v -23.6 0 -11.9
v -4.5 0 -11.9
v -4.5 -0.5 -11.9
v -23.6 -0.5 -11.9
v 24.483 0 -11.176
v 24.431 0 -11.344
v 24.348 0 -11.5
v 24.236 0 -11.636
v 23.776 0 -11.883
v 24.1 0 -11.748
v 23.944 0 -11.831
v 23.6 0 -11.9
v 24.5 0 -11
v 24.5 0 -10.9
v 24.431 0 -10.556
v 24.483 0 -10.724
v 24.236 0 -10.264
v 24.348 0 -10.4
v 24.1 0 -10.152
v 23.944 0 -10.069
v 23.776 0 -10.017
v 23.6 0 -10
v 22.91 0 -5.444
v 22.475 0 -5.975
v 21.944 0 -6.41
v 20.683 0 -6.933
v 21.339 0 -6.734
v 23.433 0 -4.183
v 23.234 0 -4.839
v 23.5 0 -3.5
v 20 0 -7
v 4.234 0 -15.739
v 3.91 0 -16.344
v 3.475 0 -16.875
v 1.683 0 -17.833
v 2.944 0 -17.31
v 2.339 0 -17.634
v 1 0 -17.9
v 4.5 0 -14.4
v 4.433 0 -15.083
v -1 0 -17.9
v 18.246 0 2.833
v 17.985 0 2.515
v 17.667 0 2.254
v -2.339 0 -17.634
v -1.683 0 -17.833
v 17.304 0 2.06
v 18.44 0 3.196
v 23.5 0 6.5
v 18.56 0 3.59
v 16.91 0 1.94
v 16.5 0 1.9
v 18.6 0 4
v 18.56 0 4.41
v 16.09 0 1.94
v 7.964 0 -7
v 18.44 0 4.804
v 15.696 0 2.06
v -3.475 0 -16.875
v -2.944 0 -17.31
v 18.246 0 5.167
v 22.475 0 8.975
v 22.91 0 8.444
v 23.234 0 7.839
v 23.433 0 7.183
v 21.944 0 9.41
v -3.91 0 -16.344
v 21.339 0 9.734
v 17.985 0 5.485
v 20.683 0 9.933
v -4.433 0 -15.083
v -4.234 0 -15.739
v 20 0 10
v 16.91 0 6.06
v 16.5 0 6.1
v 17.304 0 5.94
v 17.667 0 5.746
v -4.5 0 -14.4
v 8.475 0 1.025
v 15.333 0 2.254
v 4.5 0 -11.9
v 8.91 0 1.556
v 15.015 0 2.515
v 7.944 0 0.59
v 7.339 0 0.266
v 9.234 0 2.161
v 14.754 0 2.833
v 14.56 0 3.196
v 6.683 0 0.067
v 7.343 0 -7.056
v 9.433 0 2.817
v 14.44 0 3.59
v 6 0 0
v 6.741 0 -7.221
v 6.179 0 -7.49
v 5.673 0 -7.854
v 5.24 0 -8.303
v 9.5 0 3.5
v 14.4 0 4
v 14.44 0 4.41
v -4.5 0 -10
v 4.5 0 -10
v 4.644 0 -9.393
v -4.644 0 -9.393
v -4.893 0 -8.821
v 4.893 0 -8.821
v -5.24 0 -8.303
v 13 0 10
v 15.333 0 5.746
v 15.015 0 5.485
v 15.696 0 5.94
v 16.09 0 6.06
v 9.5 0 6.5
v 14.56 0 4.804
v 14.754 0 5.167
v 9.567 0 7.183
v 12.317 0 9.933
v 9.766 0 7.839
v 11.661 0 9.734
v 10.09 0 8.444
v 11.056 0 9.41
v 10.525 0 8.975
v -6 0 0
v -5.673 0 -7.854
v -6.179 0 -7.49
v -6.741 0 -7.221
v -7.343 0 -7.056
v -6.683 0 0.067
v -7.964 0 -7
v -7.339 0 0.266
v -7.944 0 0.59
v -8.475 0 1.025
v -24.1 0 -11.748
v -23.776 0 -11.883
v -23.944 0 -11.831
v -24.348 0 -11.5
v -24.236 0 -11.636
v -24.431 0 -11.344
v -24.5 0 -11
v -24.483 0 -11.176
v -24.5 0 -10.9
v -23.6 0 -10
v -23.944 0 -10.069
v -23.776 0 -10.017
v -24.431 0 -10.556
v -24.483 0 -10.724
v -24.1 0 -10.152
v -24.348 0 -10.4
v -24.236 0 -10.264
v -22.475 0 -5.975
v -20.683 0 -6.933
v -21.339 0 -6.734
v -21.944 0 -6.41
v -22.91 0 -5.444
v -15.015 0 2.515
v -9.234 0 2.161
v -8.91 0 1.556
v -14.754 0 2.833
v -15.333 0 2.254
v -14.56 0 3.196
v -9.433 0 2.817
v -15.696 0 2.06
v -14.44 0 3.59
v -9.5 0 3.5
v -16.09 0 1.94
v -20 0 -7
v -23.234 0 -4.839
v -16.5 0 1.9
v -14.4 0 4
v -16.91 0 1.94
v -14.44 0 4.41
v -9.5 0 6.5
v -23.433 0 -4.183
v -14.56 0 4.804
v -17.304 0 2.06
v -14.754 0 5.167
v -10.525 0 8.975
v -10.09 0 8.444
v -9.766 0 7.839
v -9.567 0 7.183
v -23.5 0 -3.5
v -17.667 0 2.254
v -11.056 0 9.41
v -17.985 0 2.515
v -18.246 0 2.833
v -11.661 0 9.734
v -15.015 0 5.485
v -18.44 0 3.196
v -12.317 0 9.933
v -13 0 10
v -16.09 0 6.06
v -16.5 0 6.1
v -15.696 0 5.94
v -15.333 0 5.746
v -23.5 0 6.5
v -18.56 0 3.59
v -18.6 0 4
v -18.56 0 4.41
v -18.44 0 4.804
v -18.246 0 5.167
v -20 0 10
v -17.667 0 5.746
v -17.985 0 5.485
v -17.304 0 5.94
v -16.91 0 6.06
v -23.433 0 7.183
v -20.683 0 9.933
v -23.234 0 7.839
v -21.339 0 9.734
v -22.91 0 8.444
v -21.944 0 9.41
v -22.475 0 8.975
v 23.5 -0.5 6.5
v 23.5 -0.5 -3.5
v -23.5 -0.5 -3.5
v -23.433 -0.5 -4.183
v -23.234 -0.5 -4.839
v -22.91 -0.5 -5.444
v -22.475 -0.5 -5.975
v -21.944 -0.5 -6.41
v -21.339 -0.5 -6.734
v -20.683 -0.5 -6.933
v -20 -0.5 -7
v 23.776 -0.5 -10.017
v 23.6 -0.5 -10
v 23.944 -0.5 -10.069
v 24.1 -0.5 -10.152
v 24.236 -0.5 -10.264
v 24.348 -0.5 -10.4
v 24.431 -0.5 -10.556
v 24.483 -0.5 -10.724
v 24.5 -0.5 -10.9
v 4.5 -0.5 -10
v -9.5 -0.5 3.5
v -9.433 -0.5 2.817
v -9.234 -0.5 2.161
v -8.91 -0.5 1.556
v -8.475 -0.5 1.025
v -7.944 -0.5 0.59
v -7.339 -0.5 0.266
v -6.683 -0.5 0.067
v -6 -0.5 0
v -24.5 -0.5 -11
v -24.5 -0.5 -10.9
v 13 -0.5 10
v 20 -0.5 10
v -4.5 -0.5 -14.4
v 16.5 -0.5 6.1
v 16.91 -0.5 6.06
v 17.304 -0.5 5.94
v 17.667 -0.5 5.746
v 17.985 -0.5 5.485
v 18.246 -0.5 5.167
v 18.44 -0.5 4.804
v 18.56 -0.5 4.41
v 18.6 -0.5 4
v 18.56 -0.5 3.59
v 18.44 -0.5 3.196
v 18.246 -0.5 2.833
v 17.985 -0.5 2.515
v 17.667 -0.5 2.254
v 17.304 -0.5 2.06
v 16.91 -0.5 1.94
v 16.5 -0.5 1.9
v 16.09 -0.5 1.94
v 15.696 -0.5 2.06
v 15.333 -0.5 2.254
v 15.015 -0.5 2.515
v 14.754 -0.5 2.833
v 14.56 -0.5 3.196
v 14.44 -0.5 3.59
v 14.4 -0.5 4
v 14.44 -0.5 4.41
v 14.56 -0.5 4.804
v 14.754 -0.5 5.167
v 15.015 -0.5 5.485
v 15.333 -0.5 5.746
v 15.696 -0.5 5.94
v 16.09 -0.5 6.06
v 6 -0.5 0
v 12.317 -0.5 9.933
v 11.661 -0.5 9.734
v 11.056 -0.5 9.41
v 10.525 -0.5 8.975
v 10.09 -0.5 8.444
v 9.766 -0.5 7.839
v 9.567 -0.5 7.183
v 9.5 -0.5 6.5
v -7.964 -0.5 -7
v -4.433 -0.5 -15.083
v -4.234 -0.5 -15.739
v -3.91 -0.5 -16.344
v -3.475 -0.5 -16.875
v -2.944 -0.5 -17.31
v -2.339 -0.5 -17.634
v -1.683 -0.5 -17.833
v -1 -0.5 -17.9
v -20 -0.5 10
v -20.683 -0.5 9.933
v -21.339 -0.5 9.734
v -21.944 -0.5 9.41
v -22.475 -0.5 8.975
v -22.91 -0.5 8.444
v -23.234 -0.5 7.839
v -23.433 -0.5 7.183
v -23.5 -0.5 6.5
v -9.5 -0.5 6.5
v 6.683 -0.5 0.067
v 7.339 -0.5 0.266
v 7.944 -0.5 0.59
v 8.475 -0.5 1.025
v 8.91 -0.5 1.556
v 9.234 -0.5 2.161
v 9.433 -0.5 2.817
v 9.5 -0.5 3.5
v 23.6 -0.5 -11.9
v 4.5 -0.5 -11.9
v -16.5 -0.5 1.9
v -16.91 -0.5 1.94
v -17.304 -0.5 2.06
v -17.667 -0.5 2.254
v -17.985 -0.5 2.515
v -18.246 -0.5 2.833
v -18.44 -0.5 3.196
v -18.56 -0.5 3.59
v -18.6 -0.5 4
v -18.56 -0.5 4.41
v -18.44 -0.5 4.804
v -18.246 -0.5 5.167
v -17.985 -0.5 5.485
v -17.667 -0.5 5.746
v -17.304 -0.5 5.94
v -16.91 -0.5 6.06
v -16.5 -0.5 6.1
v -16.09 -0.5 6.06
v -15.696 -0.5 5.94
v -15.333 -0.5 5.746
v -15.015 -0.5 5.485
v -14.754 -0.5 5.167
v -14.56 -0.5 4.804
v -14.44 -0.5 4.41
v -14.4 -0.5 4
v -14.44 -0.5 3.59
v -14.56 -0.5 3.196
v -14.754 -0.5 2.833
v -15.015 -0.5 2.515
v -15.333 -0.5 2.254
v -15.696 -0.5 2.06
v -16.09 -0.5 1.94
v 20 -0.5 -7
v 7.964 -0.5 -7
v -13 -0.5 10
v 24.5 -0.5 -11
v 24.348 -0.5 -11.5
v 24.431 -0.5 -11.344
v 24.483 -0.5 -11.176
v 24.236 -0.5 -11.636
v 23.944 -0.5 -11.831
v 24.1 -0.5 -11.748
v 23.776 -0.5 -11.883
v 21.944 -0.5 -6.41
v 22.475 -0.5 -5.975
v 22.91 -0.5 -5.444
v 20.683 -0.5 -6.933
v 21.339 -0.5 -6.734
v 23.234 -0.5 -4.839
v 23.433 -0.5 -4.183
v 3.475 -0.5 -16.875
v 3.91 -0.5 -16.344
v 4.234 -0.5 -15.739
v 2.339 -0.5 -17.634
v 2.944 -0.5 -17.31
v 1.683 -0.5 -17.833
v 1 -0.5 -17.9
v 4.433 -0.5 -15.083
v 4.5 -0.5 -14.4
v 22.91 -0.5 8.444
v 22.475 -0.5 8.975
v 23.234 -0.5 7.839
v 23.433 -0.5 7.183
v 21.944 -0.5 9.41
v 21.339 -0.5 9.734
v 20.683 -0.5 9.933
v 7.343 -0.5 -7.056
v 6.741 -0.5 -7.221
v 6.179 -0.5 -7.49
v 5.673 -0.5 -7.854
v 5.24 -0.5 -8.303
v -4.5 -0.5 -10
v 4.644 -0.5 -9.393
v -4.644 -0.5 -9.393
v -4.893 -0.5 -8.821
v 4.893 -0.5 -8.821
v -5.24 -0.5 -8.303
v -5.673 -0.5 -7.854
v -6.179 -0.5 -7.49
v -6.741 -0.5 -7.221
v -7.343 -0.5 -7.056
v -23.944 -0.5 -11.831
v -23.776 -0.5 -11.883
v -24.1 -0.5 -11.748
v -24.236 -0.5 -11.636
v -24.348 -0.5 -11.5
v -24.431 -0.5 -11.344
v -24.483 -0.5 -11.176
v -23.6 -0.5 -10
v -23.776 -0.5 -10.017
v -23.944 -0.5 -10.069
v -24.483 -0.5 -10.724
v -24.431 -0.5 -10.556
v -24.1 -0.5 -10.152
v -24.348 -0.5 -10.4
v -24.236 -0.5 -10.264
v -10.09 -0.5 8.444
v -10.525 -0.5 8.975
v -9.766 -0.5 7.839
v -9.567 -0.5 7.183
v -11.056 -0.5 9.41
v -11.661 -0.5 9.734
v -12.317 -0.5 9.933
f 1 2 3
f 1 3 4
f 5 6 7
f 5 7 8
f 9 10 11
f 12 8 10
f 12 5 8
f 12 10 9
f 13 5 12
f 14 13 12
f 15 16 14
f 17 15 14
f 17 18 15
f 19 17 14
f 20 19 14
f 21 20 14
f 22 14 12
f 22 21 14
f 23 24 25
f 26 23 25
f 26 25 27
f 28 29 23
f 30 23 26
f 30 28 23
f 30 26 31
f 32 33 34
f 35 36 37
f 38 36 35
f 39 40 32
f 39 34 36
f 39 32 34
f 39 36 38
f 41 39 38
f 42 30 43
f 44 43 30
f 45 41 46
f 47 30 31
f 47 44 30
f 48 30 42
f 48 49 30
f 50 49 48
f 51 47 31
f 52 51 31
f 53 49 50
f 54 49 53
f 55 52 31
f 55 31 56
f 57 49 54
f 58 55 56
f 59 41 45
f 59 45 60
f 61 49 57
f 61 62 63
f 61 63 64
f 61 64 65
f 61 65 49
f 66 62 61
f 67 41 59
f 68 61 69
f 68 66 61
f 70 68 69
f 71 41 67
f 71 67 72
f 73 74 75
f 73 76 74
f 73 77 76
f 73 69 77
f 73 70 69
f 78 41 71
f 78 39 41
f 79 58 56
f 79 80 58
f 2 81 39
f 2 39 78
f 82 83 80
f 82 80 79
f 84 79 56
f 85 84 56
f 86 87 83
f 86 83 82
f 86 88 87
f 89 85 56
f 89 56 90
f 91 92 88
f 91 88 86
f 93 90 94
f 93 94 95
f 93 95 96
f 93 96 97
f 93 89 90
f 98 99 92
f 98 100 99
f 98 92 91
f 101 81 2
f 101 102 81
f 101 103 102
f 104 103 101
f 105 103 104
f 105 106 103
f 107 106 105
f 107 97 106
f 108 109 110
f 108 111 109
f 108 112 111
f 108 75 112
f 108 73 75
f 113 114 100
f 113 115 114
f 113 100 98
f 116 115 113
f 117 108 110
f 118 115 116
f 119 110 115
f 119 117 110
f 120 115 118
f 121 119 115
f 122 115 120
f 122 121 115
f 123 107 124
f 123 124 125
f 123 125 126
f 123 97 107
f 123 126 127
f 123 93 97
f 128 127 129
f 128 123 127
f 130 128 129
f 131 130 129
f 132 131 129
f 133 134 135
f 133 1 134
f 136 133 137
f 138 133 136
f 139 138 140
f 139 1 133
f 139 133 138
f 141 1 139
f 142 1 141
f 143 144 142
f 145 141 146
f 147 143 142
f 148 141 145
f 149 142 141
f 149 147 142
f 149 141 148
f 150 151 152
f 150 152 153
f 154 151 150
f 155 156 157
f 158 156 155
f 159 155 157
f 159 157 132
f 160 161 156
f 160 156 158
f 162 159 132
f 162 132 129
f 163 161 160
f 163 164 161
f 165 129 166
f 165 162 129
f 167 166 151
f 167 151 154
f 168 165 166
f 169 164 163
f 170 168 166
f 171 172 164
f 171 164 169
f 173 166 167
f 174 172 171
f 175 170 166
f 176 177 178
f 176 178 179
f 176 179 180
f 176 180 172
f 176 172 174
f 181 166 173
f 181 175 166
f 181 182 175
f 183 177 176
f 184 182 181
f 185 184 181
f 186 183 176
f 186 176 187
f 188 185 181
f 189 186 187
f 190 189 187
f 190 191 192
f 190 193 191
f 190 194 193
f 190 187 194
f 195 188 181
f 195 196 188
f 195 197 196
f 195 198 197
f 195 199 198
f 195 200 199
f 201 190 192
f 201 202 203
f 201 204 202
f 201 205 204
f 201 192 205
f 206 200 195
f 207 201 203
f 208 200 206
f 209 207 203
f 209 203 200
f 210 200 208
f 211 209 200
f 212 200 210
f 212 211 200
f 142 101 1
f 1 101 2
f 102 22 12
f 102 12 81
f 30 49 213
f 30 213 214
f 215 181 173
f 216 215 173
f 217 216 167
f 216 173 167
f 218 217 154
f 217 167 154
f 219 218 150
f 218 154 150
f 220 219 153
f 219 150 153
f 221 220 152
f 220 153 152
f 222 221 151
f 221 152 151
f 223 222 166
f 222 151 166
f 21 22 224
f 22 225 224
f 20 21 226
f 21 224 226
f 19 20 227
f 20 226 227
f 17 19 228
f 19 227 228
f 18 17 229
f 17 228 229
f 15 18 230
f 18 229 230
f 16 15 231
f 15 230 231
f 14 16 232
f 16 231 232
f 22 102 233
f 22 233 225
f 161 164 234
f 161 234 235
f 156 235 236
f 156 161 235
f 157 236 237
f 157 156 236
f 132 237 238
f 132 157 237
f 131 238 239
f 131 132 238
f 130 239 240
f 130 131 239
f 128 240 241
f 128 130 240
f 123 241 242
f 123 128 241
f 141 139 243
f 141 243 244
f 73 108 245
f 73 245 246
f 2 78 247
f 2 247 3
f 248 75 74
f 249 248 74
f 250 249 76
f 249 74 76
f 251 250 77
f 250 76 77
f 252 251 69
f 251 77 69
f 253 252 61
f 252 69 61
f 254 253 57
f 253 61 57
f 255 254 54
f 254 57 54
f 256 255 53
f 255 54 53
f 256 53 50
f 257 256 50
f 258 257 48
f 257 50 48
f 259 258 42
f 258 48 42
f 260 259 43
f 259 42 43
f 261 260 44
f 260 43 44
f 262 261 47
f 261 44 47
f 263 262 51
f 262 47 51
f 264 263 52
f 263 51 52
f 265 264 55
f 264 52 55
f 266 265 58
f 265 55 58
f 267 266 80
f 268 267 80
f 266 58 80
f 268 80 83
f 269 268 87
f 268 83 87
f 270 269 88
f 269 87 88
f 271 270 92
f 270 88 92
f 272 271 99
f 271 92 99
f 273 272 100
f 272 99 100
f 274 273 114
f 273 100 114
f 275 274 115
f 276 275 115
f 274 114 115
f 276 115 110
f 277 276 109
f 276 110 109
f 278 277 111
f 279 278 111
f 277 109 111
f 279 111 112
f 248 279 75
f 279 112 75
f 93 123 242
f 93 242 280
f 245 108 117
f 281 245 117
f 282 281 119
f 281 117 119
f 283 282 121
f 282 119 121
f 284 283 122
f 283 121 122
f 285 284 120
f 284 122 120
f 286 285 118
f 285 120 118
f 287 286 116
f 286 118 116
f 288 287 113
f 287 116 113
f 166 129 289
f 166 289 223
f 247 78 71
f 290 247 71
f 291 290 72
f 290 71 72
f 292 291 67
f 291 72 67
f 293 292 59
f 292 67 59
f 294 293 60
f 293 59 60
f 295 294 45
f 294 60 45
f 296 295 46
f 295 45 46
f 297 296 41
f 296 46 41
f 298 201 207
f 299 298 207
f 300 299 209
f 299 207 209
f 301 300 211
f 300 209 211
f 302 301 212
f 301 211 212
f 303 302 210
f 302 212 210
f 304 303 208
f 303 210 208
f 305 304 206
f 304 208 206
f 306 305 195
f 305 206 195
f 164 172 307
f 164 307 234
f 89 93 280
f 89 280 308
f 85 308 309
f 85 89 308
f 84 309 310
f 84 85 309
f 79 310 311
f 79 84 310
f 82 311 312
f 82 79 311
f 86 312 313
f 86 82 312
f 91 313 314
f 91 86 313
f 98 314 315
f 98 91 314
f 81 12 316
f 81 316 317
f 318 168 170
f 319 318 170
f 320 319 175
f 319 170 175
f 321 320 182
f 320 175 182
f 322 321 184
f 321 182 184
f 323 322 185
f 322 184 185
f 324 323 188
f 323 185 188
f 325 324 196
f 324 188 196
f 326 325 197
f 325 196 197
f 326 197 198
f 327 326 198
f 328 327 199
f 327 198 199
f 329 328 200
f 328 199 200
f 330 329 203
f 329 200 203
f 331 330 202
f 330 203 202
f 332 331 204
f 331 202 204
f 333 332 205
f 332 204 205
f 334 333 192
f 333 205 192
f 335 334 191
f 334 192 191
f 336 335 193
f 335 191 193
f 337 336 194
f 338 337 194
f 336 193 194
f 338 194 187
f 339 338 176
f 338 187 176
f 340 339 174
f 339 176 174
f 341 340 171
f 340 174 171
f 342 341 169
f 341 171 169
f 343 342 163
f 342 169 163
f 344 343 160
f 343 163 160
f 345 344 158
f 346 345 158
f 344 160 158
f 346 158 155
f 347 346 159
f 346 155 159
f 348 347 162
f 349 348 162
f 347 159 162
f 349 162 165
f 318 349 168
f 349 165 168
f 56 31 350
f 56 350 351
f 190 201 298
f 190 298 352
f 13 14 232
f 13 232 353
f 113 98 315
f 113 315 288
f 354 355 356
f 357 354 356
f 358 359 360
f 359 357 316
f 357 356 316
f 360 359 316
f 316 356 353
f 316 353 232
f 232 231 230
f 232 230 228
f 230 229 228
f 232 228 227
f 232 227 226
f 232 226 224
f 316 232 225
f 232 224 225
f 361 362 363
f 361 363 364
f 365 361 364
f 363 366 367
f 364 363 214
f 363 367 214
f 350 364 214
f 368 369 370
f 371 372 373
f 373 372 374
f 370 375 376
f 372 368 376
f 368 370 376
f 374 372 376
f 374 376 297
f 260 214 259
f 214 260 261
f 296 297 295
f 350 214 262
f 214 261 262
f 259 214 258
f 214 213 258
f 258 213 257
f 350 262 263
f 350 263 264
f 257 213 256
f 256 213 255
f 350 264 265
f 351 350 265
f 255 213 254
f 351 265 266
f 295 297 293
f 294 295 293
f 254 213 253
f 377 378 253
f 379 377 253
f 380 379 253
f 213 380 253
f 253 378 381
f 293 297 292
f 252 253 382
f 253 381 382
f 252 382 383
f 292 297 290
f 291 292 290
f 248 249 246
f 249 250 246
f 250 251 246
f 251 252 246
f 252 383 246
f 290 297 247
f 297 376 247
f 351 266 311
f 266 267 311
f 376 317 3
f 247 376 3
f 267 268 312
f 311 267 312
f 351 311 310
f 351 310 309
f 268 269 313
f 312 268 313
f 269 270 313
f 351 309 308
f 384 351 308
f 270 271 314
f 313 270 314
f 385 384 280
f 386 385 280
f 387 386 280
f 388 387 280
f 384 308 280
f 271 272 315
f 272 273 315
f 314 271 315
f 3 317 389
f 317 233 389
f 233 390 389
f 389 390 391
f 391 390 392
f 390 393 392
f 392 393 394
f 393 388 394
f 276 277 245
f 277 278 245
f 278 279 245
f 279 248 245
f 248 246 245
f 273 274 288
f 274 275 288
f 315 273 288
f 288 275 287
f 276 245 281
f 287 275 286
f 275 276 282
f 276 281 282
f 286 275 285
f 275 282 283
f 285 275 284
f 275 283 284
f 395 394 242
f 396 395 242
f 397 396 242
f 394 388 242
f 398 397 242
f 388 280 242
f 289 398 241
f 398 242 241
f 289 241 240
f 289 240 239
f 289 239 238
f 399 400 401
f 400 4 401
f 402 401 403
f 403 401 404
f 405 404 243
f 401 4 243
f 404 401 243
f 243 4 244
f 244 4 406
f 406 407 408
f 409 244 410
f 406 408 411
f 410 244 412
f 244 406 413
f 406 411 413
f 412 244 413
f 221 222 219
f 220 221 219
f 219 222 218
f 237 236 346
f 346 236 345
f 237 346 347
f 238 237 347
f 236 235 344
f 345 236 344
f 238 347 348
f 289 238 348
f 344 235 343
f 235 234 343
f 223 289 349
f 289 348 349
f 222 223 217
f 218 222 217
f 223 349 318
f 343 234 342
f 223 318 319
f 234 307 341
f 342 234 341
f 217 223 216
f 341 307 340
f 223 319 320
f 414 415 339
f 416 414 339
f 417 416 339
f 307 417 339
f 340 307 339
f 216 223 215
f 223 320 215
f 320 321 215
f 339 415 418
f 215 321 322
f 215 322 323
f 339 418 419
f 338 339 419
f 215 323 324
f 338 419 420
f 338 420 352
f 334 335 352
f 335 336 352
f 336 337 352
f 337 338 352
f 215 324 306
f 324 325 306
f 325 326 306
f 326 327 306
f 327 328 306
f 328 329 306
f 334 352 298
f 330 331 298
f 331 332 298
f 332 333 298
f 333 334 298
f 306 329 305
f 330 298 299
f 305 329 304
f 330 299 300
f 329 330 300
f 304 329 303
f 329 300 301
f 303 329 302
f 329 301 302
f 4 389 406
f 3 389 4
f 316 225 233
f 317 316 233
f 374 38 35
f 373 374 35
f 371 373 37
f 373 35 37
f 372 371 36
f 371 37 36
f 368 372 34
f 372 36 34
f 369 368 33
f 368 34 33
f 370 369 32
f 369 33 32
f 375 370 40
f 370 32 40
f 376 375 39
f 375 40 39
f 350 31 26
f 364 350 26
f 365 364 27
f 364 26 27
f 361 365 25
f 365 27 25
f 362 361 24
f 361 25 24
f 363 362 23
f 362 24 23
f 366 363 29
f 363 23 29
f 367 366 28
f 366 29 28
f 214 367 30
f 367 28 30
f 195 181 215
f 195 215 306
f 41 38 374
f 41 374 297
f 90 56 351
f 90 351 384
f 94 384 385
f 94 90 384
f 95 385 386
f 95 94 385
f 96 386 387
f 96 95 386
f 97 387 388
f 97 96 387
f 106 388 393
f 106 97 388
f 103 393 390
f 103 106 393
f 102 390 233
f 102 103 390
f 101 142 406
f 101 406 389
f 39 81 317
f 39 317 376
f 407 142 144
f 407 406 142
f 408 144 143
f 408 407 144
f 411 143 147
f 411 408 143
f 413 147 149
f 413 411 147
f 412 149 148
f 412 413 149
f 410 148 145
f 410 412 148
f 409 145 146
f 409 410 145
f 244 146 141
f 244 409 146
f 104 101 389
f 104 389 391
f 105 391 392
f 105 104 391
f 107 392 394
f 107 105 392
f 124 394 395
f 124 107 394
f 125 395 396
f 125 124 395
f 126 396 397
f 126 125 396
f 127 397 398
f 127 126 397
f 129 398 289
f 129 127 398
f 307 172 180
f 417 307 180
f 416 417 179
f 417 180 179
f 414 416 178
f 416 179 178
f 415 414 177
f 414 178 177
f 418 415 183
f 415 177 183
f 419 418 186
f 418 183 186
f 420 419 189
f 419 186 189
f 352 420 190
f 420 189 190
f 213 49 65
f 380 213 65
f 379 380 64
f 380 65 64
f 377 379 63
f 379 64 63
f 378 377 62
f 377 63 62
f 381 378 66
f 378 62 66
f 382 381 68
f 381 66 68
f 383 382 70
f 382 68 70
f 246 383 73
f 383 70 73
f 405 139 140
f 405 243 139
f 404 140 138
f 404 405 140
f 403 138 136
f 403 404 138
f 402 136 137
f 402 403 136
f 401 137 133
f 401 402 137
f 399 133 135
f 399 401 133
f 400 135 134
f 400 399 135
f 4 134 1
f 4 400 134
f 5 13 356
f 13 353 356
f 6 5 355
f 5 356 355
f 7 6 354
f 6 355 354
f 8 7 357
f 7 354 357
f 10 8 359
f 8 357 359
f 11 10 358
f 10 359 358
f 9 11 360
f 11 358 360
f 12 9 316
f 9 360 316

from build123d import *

# Parameters (mm, degrees)
SKETCH2_R          = 2.1
BASE_FLANGE1_DEPTH = 0.5
FILLET1_R          = 3.5
FILLET2_R          = 0.9


# Sheet-metal steps are written as plain solids
with BuildPart() as part:
    # Base-Flange1: sheet metal written as solids
    # Sketch2 → Base-Flange1 (new body)
    with BuildSketch(Plane(origin=(0, 0, 0), x_dir=(1, 0, 0), z_dir=(0, 1, 0))):
        Polygon((-9.5, 0), (9.5, 0), (9.5, -10), (23.5, -10), (23.5, 7), (4.5, 7), (4.5, 10), (24.5, 10), (24.5, 11.9), (4.5, 11.9), (4.5, 17.9), (-4.5, 17.9), (-4.5, 11.9), (-24.5, 11.9), (-24.5, 10), (-4.5, 10), (-4.5, 7), (-23.5, 7), (-23.5, -10), (-9.5, -10), align=None)
        with Locations(Location((16.5, -4, 0), (0, 0, 270))):
            Circle(SKETCH2_R, mode=Mode.SUBTRACT)
        with Locations(Location((-16.5, -4, 0), (0, 0, 90))):
            Circle(SKETCH2_R, mode=Mode.SUBTRACT)
    extrude(amount=-BASE_FLANGE1_DEPTH)

    # Fillet1
    # the kernel refuses this fillet: 3.5 mm, written as the material it adds along each edge
    with BuildSketch(Plane(origin=(9.5, 0, 0), x_dir=(-1, 0, 0), z_dir=(0, -1, 0))) as fillet1_piece_1:
        with BuildLine():
            CenterArc((FILLET1_R, -FILLET1_R), FILLET1_R, 90, 90)
            Line((0, -FILLET1_R), (0, 0))
            Line((0, 0), (FILLET1_R, 0))
        make_face()
    extrude(amount=0.5)
    with BuildSketch(Plane(origin=(-9.5, 0, 0), x_dir=(1, 0, 0), z_dir=(0, -1, 0))) as fillet1_piece_2:
        with BuildLine():
            CenterArc((FILLET1_R, FILLET1_R), FILLET1_R, 180, 90)
            Line((0, FILLET1_R), (0, 0))
            Line((0, 0), (FILLET1_R, 0))
        make_face()
    extrude(amount=0.5)
    with BuildSketch(Plane(origin=(-4.5, 0, -7), x_dir=(0, 0, -1), z_dir=(0, -1, 0))) as fillet1_piece_3:
        with BuildLine():
            CenterArc((3.5, -3.464101615), FILLET1_R, 98.213210702, 81.786789298)
            Line((0, -3.464101615), (0, 0))
            Line((0, 0), (3, 0))
        make_face()
    extrude(amount=0.5)
    with BuildSketch(Plane(origin=(4.5, 0, -7), x_dir=(1, 0, 0), z_dir=(0, -1, 0))) as fillet1_piece_4:
        with BuildLine():
            CenterArc((3.464101615, -3.5), FILLET1_R, 90, 81.786789298)
            Line((0, -3), (0, 0))
            Line((0, 0), (3.464101615, 0))
        make_face()
    extrude(amount=0.5)
    # the kernel refuses this fillet: 3.5 mm, written as the material it takes off along each edge
    with BuildSketch(Plane(origin=(-9.5, 8.75, 10), x_dir=(-1, 0, 0), z_dir=(0, -1, 0)), Plane(origin=(-23.5, 8.75, 10), x_dir=(0, 0, -1), z_dir=(0, -1, 0)), Plane(origin=(-23.5, 8.75, -7), x_dir=(1, 0, 0), z_dir=(0, -1, 0)), Plane(origin=(-4.5, 8.75, -17.9), x_dir=(1, 0, 0), z_dir=(0, -1, 0)), Plane(origin=(4.5, 8.75, -17.9), x_dir=(0, 0, 1), z_dir=(0, -1, 0)), Plane(origin=(23.5, 8.75, -7), x_dir=(0, 0, 1), z_dir=(0, -1, 0)), Plane(origin=(23.5, 8.75, 10), x_dir=(-1, 0, 0), z_dir=(0, -1, 0)), Plane(origin=(9.5, 8.75, 10), x_dir=(0, 0, -1), z_dir=(0, -1, 0))) as fillet1_2_piece_1:
        with BuildLine():
            CenterArc((FILLET1_R, FILLET1_R), FILLET1_R, 180, 90)
            Line((0, FILLET1_R), (0, 0))
            Line((0, 0), (FILLET1_R, 0))
        make_face()
    extrude(amount=18, mode=Mode.SUBTRACT)

    # Fillet2
    fillet2_edges = [part.edges().sort_by_distance(p)[0] for p in [
        (-24.5, -0.25, -10),
        (-24.5, -0.25, -11.9),
        (24.5, -0.25, -11.9),
        (24.5, -0.25, -10),
    ]]
    fillet(fillet2_edges, radius=FILLET2_R)


solid = part.part
